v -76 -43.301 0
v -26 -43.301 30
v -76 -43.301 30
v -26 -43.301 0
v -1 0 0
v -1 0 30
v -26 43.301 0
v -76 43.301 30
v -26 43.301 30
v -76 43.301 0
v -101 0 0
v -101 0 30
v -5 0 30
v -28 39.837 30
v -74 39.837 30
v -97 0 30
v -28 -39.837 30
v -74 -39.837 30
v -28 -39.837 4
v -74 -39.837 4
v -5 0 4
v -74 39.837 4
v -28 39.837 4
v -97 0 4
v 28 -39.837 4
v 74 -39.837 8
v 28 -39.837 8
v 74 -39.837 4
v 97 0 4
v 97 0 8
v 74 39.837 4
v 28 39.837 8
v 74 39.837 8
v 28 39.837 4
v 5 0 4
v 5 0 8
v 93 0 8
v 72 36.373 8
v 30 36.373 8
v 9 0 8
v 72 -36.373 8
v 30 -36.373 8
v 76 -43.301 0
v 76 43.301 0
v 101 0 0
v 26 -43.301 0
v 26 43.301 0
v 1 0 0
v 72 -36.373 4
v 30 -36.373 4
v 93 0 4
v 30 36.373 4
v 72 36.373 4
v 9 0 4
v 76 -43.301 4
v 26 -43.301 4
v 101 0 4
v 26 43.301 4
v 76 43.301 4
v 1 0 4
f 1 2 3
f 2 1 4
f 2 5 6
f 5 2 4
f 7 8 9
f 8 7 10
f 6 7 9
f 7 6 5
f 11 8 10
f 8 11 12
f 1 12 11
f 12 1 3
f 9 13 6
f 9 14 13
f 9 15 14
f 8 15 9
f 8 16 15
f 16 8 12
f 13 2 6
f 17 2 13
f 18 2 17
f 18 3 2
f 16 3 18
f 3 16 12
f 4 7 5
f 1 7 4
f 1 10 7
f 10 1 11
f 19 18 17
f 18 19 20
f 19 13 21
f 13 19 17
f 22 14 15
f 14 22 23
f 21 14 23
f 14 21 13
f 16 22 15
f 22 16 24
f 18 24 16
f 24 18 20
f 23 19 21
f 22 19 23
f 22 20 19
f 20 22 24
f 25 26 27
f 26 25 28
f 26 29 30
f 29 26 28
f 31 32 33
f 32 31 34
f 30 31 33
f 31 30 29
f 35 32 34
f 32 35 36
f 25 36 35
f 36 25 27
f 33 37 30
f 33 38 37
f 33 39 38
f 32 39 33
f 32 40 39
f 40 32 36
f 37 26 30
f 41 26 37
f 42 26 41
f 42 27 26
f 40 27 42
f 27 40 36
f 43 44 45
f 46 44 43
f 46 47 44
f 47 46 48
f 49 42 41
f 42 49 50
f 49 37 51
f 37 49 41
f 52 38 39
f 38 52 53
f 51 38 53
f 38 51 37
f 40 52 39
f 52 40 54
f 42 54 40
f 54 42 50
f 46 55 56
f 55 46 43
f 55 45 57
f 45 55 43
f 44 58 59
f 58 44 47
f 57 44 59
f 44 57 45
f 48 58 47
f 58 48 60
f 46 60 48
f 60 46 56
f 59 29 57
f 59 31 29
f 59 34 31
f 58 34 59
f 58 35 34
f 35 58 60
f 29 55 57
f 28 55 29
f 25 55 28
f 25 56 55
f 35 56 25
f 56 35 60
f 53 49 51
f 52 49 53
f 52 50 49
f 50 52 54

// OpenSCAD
show_options = "both";//[both,box,cap]

//in mm
height = 30;//[1:200]
//in mm
radius = 50;//[1:200]
sided = 6;//[3:100]
//in mm
wallthickness = 4;//[1:20]


if(show_options == "both" || show_options == "box")
translate([show_options == "both" ? -radius - 1 : 0,0,0])
difference(){
	cylinder(h = height, r = radius, $fn = sided);
	translate([0,0,wallthickness])
	cylinder(h = height, r = radius-wallthickness, $fn = sided);
}


if(show_options == "both" || show_options == "cap")
translate([show_options == "both" ? radius + 1 : 0,0,0])
union(){
	cylinder(h = wallthickness, r = radius, $fn = sided);
	difference(){
		cylinder(h = (wallthickness*2), r = radius-wallthickness, $fn = sided);
		translate([0,0,wallthickness-0.1])
			cylinder(h = height, r = radius-(wallthickness*2), $fn = sided);
	}

}
